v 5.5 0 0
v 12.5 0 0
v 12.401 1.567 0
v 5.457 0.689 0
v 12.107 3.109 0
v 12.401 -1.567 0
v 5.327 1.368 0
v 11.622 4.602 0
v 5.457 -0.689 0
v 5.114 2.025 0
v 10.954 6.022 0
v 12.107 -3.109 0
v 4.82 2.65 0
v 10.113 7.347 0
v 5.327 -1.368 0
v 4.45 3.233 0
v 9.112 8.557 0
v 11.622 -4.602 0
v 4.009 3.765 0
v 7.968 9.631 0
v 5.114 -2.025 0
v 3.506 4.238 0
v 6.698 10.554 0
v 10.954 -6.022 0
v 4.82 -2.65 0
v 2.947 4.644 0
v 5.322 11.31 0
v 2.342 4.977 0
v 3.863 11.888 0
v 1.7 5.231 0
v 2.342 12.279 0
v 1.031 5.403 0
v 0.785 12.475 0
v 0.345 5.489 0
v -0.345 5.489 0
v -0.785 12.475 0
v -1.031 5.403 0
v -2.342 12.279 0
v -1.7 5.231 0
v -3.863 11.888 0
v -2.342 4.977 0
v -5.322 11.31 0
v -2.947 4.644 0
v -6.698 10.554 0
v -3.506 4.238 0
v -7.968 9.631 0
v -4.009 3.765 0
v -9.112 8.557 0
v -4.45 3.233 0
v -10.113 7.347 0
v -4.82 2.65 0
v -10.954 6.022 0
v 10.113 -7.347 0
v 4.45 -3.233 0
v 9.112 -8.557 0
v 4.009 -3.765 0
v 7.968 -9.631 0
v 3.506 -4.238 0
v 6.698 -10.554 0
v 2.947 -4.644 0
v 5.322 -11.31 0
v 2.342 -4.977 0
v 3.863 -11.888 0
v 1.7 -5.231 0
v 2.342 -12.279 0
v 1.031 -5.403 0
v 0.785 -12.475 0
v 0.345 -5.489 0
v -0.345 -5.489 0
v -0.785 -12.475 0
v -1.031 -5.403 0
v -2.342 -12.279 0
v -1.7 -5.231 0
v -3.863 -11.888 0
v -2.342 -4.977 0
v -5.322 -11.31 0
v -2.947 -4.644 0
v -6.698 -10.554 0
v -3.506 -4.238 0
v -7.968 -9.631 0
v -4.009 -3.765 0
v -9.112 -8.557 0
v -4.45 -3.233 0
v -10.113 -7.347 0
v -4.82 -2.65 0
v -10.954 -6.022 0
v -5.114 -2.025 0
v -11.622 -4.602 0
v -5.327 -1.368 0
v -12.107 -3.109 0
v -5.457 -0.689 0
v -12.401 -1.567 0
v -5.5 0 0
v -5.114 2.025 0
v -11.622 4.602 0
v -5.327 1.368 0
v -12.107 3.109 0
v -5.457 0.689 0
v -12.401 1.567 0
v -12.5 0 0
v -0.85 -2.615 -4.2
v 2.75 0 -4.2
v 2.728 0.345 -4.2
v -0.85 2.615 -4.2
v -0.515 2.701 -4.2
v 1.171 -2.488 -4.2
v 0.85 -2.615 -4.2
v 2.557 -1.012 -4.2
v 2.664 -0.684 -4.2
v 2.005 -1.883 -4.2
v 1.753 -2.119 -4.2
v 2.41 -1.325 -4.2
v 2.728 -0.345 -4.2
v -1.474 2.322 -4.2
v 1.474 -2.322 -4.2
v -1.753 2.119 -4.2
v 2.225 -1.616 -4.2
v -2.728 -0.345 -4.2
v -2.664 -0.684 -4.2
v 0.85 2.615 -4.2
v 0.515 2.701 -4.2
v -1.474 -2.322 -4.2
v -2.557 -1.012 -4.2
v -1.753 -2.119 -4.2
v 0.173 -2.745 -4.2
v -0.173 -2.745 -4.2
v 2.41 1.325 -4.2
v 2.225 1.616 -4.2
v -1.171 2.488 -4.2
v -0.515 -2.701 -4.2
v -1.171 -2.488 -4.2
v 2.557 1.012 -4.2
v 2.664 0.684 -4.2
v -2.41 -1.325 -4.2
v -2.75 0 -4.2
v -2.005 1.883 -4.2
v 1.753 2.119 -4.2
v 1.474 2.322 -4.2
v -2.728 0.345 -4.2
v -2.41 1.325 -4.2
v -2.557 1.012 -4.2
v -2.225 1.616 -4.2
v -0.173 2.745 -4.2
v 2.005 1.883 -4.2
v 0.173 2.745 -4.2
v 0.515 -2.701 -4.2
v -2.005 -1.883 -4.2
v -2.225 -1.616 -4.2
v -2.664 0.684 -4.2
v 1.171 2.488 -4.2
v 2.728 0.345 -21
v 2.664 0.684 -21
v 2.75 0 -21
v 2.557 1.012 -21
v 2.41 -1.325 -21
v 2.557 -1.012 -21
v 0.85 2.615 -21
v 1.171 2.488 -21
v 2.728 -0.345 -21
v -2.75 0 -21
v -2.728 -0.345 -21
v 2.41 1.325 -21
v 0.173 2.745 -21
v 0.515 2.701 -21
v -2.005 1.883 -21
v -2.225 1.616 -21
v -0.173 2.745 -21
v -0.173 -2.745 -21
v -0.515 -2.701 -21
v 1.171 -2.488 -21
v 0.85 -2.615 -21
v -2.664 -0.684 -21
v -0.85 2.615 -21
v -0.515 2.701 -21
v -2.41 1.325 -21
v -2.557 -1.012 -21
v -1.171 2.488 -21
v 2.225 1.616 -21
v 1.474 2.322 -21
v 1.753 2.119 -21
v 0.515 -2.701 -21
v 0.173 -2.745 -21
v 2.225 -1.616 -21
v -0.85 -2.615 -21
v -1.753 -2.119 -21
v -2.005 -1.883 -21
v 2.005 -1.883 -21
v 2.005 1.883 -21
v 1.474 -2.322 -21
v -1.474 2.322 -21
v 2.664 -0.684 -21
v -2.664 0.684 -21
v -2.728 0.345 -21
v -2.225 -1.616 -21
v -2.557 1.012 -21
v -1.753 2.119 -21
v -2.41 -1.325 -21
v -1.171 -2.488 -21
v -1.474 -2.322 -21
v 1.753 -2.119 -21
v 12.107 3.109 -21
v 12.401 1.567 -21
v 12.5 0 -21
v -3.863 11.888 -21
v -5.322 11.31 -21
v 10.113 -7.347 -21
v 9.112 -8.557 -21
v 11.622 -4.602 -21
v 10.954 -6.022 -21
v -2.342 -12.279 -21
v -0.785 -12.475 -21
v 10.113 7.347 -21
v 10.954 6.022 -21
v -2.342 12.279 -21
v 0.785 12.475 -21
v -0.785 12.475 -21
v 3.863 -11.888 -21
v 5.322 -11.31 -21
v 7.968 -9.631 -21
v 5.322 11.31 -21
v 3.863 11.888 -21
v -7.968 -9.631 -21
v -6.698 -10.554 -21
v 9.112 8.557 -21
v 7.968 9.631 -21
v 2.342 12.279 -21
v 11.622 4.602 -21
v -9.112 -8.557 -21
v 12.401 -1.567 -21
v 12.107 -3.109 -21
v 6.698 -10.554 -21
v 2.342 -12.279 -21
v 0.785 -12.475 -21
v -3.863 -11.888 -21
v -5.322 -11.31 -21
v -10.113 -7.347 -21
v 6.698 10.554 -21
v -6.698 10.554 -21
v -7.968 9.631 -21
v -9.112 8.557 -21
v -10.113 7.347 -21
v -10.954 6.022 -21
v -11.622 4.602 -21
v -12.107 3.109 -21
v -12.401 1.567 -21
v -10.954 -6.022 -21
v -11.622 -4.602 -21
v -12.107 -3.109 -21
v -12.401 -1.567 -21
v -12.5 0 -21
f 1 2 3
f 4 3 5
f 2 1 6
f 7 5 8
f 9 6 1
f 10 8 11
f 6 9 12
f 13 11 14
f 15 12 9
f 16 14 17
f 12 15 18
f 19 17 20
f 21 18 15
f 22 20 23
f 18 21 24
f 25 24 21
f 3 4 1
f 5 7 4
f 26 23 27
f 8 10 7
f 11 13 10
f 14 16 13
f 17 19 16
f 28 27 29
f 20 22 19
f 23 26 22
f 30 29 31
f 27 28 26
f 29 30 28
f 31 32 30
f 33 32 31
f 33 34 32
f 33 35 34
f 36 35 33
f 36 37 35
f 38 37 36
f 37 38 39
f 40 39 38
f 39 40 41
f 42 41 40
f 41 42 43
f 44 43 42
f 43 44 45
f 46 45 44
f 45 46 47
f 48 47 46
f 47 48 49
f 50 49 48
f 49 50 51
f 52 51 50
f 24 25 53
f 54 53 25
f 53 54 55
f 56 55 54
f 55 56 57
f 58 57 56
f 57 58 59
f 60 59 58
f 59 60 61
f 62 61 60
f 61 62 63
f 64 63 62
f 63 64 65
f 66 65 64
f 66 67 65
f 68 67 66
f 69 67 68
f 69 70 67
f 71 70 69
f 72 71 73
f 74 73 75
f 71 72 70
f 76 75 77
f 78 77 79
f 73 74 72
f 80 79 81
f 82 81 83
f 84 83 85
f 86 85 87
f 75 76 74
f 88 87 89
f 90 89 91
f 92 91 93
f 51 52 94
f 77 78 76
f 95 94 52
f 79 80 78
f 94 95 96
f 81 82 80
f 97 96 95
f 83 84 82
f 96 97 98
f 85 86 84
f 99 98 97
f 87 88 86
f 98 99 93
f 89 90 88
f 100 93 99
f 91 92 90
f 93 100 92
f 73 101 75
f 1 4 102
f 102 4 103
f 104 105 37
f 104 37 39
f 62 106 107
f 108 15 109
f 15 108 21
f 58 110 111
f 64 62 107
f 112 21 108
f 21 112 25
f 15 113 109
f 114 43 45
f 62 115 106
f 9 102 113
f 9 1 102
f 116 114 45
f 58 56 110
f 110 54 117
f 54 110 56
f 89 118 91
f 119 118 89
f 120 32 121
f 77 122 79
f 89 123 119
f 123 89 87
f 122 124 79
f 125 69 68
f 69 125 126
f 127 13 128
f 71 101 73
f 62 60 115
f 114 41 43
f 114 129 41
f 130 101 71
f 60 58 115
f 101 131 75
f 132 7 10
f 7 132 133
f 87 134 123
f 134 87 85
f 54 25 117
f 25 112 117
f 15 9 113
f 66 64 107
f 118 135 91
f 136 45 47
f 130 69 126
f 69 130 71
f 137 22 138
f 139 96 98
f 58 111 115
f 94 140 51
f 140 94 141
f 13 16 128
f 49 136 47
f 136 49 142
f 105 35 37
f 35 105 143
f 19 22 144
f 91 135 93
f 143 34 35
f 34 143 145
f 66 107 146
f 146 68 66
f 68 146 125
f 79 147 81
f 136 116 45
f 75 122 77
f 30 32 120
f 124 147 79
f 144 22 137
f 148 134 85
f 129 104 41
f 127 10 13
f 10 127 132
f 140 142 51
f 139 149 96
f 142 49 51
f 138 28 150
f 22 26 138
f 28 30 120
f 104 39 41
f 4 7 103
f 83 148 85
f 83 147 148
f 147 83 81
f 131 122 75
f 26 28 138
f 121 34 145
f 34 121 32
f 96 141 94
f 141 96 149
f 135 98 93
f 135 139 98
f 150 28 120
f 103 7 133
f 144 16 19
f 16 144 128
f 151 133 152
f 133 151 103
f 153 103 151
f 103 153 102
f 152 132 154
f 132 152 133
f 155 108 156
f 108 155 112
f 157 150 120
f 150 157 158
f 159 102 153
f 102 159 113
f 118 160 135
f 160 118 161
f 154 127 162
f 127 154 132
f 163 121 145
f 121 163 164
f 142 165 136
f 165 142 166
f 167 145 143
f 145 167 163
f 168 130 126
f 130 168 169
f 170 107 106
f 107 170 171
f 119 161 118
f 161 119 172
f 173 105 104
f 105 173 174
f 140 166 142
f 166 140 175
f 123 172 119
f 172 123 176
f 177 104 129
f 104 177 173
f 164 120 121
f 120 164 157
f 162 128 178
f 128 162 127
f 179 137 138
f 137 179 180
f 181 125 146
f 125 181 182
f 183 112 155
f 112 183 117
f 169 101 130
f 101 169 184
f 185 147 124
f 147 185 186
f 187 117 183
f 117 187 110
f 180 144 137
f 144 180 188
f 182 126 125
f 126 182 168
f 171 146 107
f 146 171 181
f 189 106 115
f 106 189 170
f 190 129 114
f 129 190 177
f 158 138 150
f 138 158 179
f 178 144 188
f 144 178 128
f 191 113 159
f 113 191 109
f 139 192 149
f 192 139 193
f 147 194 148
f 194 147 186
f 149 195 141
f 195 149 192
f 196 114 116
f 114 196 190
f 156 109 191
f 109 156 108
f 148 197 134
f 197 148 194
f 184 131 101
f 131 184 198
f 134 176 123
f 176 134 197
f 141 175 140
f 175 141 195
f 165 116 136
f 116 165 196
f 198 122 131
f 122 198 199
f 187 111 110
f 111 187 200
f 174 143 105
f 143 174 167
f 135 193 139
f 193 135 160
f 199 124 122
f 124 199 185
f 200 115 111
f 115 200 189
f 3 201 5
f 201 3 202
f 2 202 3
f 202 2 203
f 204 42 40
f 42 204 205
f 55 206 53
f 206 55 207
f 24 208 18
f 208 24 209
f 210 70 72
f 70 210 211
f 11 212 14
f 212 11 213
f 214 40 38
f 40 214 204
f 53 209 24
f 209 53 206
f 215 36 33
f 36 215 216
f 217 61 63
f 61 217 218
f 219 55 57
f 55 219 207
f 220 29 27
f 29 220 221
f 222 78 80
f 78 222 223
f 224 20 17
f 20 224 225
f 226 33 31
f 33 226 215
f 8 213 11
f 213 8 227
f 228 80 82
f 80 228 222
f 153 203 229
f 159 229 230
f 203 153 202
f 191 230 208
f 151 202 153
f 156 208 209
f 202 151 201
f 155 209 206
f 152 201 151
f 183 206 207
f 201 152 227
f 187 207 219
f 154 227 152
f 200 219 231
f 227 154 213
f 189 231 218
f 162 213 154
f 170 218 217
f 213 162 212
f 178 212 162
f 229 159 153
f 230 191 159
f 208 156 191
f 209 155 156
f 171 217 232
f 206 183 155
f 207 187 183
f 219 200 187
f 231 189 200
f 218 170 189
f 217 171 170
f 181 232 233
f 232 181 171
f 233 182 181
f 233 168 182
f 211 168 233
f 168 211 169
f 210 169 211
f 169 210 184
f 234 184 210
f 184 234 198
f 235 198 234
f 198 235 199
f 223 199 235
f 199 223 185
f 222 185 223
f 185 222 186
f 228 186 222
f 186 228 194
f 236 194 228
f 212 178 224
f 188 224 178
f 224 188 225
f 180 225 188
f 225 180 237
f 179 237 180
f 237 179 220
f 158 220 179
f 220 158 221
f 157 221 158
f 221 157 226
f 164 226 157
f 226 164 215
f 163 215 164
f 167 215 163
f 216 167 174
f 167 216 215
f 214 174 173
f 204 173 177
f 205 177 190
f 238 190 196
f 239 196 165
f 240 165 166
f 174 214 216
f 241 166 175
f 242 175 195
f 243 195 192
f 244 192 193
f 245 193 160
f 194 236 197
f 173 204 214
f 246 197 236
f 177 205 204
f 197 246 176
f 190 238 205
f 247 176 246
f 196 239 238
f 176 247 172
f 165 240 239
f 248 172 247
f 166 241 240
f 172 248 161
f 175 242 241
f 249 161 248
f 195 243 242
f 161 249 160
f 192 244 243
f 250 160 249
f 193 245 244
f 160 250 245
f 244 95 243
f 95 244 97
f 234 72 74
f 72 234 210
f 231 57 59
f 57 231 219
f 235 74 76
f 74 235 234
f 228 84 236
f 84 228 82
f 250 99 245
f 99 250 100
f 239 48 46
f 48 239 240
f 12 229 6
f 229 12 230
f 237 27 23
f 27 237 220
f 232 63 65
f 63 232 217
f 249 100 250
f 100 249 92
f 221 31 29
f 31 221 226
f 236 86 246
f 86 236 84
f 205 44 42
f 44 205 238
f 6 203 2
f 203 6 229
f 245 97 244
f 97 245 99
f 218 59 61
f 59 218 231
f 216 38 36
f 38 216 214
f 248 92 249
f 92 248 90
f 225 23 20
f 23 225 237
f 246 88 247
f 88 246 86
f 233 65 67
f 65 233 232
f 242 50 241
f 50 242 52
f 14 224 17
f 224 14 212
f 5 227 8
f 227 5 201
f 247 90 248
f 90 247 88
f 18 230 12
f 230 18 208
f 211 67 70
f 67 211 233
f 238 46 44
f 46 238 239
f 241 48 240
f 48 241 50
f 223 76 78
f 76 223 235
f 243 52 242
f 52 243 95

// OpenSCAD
$fn = 50;


difference() {
	union() {
		translate(v = [0, 0, -21.0000000000]) {
			cylinder(h = 21, r = 12.5000000000);
		}
	}
	union() {
		translate(v = [0, 0, 0]) {
			rotate(a = [0, 0, 0]) {
				difference() {
					union() {
						translate(v = [0, 0, -24.0000000000]) {
							cylinder(h = 24, r = 2.2500000000);
						}
						translate(v = [0, 0, -4.2000000000]) {
							cylinder(h = 4.2000000000, r1 = 2.7500000000, r2 = 5.5000000000);
						}
						translate(v = [0, 0, -24.0000000000]) {
							cylinder(h = 24, r = 2.7500000000);
						}
						translate(v = [0, 0, -24.0000000000]) {
							cylinder(h = 24, r = 2.2500000000);
						}
					}
					union();
				}
			}
		}
	}
}
